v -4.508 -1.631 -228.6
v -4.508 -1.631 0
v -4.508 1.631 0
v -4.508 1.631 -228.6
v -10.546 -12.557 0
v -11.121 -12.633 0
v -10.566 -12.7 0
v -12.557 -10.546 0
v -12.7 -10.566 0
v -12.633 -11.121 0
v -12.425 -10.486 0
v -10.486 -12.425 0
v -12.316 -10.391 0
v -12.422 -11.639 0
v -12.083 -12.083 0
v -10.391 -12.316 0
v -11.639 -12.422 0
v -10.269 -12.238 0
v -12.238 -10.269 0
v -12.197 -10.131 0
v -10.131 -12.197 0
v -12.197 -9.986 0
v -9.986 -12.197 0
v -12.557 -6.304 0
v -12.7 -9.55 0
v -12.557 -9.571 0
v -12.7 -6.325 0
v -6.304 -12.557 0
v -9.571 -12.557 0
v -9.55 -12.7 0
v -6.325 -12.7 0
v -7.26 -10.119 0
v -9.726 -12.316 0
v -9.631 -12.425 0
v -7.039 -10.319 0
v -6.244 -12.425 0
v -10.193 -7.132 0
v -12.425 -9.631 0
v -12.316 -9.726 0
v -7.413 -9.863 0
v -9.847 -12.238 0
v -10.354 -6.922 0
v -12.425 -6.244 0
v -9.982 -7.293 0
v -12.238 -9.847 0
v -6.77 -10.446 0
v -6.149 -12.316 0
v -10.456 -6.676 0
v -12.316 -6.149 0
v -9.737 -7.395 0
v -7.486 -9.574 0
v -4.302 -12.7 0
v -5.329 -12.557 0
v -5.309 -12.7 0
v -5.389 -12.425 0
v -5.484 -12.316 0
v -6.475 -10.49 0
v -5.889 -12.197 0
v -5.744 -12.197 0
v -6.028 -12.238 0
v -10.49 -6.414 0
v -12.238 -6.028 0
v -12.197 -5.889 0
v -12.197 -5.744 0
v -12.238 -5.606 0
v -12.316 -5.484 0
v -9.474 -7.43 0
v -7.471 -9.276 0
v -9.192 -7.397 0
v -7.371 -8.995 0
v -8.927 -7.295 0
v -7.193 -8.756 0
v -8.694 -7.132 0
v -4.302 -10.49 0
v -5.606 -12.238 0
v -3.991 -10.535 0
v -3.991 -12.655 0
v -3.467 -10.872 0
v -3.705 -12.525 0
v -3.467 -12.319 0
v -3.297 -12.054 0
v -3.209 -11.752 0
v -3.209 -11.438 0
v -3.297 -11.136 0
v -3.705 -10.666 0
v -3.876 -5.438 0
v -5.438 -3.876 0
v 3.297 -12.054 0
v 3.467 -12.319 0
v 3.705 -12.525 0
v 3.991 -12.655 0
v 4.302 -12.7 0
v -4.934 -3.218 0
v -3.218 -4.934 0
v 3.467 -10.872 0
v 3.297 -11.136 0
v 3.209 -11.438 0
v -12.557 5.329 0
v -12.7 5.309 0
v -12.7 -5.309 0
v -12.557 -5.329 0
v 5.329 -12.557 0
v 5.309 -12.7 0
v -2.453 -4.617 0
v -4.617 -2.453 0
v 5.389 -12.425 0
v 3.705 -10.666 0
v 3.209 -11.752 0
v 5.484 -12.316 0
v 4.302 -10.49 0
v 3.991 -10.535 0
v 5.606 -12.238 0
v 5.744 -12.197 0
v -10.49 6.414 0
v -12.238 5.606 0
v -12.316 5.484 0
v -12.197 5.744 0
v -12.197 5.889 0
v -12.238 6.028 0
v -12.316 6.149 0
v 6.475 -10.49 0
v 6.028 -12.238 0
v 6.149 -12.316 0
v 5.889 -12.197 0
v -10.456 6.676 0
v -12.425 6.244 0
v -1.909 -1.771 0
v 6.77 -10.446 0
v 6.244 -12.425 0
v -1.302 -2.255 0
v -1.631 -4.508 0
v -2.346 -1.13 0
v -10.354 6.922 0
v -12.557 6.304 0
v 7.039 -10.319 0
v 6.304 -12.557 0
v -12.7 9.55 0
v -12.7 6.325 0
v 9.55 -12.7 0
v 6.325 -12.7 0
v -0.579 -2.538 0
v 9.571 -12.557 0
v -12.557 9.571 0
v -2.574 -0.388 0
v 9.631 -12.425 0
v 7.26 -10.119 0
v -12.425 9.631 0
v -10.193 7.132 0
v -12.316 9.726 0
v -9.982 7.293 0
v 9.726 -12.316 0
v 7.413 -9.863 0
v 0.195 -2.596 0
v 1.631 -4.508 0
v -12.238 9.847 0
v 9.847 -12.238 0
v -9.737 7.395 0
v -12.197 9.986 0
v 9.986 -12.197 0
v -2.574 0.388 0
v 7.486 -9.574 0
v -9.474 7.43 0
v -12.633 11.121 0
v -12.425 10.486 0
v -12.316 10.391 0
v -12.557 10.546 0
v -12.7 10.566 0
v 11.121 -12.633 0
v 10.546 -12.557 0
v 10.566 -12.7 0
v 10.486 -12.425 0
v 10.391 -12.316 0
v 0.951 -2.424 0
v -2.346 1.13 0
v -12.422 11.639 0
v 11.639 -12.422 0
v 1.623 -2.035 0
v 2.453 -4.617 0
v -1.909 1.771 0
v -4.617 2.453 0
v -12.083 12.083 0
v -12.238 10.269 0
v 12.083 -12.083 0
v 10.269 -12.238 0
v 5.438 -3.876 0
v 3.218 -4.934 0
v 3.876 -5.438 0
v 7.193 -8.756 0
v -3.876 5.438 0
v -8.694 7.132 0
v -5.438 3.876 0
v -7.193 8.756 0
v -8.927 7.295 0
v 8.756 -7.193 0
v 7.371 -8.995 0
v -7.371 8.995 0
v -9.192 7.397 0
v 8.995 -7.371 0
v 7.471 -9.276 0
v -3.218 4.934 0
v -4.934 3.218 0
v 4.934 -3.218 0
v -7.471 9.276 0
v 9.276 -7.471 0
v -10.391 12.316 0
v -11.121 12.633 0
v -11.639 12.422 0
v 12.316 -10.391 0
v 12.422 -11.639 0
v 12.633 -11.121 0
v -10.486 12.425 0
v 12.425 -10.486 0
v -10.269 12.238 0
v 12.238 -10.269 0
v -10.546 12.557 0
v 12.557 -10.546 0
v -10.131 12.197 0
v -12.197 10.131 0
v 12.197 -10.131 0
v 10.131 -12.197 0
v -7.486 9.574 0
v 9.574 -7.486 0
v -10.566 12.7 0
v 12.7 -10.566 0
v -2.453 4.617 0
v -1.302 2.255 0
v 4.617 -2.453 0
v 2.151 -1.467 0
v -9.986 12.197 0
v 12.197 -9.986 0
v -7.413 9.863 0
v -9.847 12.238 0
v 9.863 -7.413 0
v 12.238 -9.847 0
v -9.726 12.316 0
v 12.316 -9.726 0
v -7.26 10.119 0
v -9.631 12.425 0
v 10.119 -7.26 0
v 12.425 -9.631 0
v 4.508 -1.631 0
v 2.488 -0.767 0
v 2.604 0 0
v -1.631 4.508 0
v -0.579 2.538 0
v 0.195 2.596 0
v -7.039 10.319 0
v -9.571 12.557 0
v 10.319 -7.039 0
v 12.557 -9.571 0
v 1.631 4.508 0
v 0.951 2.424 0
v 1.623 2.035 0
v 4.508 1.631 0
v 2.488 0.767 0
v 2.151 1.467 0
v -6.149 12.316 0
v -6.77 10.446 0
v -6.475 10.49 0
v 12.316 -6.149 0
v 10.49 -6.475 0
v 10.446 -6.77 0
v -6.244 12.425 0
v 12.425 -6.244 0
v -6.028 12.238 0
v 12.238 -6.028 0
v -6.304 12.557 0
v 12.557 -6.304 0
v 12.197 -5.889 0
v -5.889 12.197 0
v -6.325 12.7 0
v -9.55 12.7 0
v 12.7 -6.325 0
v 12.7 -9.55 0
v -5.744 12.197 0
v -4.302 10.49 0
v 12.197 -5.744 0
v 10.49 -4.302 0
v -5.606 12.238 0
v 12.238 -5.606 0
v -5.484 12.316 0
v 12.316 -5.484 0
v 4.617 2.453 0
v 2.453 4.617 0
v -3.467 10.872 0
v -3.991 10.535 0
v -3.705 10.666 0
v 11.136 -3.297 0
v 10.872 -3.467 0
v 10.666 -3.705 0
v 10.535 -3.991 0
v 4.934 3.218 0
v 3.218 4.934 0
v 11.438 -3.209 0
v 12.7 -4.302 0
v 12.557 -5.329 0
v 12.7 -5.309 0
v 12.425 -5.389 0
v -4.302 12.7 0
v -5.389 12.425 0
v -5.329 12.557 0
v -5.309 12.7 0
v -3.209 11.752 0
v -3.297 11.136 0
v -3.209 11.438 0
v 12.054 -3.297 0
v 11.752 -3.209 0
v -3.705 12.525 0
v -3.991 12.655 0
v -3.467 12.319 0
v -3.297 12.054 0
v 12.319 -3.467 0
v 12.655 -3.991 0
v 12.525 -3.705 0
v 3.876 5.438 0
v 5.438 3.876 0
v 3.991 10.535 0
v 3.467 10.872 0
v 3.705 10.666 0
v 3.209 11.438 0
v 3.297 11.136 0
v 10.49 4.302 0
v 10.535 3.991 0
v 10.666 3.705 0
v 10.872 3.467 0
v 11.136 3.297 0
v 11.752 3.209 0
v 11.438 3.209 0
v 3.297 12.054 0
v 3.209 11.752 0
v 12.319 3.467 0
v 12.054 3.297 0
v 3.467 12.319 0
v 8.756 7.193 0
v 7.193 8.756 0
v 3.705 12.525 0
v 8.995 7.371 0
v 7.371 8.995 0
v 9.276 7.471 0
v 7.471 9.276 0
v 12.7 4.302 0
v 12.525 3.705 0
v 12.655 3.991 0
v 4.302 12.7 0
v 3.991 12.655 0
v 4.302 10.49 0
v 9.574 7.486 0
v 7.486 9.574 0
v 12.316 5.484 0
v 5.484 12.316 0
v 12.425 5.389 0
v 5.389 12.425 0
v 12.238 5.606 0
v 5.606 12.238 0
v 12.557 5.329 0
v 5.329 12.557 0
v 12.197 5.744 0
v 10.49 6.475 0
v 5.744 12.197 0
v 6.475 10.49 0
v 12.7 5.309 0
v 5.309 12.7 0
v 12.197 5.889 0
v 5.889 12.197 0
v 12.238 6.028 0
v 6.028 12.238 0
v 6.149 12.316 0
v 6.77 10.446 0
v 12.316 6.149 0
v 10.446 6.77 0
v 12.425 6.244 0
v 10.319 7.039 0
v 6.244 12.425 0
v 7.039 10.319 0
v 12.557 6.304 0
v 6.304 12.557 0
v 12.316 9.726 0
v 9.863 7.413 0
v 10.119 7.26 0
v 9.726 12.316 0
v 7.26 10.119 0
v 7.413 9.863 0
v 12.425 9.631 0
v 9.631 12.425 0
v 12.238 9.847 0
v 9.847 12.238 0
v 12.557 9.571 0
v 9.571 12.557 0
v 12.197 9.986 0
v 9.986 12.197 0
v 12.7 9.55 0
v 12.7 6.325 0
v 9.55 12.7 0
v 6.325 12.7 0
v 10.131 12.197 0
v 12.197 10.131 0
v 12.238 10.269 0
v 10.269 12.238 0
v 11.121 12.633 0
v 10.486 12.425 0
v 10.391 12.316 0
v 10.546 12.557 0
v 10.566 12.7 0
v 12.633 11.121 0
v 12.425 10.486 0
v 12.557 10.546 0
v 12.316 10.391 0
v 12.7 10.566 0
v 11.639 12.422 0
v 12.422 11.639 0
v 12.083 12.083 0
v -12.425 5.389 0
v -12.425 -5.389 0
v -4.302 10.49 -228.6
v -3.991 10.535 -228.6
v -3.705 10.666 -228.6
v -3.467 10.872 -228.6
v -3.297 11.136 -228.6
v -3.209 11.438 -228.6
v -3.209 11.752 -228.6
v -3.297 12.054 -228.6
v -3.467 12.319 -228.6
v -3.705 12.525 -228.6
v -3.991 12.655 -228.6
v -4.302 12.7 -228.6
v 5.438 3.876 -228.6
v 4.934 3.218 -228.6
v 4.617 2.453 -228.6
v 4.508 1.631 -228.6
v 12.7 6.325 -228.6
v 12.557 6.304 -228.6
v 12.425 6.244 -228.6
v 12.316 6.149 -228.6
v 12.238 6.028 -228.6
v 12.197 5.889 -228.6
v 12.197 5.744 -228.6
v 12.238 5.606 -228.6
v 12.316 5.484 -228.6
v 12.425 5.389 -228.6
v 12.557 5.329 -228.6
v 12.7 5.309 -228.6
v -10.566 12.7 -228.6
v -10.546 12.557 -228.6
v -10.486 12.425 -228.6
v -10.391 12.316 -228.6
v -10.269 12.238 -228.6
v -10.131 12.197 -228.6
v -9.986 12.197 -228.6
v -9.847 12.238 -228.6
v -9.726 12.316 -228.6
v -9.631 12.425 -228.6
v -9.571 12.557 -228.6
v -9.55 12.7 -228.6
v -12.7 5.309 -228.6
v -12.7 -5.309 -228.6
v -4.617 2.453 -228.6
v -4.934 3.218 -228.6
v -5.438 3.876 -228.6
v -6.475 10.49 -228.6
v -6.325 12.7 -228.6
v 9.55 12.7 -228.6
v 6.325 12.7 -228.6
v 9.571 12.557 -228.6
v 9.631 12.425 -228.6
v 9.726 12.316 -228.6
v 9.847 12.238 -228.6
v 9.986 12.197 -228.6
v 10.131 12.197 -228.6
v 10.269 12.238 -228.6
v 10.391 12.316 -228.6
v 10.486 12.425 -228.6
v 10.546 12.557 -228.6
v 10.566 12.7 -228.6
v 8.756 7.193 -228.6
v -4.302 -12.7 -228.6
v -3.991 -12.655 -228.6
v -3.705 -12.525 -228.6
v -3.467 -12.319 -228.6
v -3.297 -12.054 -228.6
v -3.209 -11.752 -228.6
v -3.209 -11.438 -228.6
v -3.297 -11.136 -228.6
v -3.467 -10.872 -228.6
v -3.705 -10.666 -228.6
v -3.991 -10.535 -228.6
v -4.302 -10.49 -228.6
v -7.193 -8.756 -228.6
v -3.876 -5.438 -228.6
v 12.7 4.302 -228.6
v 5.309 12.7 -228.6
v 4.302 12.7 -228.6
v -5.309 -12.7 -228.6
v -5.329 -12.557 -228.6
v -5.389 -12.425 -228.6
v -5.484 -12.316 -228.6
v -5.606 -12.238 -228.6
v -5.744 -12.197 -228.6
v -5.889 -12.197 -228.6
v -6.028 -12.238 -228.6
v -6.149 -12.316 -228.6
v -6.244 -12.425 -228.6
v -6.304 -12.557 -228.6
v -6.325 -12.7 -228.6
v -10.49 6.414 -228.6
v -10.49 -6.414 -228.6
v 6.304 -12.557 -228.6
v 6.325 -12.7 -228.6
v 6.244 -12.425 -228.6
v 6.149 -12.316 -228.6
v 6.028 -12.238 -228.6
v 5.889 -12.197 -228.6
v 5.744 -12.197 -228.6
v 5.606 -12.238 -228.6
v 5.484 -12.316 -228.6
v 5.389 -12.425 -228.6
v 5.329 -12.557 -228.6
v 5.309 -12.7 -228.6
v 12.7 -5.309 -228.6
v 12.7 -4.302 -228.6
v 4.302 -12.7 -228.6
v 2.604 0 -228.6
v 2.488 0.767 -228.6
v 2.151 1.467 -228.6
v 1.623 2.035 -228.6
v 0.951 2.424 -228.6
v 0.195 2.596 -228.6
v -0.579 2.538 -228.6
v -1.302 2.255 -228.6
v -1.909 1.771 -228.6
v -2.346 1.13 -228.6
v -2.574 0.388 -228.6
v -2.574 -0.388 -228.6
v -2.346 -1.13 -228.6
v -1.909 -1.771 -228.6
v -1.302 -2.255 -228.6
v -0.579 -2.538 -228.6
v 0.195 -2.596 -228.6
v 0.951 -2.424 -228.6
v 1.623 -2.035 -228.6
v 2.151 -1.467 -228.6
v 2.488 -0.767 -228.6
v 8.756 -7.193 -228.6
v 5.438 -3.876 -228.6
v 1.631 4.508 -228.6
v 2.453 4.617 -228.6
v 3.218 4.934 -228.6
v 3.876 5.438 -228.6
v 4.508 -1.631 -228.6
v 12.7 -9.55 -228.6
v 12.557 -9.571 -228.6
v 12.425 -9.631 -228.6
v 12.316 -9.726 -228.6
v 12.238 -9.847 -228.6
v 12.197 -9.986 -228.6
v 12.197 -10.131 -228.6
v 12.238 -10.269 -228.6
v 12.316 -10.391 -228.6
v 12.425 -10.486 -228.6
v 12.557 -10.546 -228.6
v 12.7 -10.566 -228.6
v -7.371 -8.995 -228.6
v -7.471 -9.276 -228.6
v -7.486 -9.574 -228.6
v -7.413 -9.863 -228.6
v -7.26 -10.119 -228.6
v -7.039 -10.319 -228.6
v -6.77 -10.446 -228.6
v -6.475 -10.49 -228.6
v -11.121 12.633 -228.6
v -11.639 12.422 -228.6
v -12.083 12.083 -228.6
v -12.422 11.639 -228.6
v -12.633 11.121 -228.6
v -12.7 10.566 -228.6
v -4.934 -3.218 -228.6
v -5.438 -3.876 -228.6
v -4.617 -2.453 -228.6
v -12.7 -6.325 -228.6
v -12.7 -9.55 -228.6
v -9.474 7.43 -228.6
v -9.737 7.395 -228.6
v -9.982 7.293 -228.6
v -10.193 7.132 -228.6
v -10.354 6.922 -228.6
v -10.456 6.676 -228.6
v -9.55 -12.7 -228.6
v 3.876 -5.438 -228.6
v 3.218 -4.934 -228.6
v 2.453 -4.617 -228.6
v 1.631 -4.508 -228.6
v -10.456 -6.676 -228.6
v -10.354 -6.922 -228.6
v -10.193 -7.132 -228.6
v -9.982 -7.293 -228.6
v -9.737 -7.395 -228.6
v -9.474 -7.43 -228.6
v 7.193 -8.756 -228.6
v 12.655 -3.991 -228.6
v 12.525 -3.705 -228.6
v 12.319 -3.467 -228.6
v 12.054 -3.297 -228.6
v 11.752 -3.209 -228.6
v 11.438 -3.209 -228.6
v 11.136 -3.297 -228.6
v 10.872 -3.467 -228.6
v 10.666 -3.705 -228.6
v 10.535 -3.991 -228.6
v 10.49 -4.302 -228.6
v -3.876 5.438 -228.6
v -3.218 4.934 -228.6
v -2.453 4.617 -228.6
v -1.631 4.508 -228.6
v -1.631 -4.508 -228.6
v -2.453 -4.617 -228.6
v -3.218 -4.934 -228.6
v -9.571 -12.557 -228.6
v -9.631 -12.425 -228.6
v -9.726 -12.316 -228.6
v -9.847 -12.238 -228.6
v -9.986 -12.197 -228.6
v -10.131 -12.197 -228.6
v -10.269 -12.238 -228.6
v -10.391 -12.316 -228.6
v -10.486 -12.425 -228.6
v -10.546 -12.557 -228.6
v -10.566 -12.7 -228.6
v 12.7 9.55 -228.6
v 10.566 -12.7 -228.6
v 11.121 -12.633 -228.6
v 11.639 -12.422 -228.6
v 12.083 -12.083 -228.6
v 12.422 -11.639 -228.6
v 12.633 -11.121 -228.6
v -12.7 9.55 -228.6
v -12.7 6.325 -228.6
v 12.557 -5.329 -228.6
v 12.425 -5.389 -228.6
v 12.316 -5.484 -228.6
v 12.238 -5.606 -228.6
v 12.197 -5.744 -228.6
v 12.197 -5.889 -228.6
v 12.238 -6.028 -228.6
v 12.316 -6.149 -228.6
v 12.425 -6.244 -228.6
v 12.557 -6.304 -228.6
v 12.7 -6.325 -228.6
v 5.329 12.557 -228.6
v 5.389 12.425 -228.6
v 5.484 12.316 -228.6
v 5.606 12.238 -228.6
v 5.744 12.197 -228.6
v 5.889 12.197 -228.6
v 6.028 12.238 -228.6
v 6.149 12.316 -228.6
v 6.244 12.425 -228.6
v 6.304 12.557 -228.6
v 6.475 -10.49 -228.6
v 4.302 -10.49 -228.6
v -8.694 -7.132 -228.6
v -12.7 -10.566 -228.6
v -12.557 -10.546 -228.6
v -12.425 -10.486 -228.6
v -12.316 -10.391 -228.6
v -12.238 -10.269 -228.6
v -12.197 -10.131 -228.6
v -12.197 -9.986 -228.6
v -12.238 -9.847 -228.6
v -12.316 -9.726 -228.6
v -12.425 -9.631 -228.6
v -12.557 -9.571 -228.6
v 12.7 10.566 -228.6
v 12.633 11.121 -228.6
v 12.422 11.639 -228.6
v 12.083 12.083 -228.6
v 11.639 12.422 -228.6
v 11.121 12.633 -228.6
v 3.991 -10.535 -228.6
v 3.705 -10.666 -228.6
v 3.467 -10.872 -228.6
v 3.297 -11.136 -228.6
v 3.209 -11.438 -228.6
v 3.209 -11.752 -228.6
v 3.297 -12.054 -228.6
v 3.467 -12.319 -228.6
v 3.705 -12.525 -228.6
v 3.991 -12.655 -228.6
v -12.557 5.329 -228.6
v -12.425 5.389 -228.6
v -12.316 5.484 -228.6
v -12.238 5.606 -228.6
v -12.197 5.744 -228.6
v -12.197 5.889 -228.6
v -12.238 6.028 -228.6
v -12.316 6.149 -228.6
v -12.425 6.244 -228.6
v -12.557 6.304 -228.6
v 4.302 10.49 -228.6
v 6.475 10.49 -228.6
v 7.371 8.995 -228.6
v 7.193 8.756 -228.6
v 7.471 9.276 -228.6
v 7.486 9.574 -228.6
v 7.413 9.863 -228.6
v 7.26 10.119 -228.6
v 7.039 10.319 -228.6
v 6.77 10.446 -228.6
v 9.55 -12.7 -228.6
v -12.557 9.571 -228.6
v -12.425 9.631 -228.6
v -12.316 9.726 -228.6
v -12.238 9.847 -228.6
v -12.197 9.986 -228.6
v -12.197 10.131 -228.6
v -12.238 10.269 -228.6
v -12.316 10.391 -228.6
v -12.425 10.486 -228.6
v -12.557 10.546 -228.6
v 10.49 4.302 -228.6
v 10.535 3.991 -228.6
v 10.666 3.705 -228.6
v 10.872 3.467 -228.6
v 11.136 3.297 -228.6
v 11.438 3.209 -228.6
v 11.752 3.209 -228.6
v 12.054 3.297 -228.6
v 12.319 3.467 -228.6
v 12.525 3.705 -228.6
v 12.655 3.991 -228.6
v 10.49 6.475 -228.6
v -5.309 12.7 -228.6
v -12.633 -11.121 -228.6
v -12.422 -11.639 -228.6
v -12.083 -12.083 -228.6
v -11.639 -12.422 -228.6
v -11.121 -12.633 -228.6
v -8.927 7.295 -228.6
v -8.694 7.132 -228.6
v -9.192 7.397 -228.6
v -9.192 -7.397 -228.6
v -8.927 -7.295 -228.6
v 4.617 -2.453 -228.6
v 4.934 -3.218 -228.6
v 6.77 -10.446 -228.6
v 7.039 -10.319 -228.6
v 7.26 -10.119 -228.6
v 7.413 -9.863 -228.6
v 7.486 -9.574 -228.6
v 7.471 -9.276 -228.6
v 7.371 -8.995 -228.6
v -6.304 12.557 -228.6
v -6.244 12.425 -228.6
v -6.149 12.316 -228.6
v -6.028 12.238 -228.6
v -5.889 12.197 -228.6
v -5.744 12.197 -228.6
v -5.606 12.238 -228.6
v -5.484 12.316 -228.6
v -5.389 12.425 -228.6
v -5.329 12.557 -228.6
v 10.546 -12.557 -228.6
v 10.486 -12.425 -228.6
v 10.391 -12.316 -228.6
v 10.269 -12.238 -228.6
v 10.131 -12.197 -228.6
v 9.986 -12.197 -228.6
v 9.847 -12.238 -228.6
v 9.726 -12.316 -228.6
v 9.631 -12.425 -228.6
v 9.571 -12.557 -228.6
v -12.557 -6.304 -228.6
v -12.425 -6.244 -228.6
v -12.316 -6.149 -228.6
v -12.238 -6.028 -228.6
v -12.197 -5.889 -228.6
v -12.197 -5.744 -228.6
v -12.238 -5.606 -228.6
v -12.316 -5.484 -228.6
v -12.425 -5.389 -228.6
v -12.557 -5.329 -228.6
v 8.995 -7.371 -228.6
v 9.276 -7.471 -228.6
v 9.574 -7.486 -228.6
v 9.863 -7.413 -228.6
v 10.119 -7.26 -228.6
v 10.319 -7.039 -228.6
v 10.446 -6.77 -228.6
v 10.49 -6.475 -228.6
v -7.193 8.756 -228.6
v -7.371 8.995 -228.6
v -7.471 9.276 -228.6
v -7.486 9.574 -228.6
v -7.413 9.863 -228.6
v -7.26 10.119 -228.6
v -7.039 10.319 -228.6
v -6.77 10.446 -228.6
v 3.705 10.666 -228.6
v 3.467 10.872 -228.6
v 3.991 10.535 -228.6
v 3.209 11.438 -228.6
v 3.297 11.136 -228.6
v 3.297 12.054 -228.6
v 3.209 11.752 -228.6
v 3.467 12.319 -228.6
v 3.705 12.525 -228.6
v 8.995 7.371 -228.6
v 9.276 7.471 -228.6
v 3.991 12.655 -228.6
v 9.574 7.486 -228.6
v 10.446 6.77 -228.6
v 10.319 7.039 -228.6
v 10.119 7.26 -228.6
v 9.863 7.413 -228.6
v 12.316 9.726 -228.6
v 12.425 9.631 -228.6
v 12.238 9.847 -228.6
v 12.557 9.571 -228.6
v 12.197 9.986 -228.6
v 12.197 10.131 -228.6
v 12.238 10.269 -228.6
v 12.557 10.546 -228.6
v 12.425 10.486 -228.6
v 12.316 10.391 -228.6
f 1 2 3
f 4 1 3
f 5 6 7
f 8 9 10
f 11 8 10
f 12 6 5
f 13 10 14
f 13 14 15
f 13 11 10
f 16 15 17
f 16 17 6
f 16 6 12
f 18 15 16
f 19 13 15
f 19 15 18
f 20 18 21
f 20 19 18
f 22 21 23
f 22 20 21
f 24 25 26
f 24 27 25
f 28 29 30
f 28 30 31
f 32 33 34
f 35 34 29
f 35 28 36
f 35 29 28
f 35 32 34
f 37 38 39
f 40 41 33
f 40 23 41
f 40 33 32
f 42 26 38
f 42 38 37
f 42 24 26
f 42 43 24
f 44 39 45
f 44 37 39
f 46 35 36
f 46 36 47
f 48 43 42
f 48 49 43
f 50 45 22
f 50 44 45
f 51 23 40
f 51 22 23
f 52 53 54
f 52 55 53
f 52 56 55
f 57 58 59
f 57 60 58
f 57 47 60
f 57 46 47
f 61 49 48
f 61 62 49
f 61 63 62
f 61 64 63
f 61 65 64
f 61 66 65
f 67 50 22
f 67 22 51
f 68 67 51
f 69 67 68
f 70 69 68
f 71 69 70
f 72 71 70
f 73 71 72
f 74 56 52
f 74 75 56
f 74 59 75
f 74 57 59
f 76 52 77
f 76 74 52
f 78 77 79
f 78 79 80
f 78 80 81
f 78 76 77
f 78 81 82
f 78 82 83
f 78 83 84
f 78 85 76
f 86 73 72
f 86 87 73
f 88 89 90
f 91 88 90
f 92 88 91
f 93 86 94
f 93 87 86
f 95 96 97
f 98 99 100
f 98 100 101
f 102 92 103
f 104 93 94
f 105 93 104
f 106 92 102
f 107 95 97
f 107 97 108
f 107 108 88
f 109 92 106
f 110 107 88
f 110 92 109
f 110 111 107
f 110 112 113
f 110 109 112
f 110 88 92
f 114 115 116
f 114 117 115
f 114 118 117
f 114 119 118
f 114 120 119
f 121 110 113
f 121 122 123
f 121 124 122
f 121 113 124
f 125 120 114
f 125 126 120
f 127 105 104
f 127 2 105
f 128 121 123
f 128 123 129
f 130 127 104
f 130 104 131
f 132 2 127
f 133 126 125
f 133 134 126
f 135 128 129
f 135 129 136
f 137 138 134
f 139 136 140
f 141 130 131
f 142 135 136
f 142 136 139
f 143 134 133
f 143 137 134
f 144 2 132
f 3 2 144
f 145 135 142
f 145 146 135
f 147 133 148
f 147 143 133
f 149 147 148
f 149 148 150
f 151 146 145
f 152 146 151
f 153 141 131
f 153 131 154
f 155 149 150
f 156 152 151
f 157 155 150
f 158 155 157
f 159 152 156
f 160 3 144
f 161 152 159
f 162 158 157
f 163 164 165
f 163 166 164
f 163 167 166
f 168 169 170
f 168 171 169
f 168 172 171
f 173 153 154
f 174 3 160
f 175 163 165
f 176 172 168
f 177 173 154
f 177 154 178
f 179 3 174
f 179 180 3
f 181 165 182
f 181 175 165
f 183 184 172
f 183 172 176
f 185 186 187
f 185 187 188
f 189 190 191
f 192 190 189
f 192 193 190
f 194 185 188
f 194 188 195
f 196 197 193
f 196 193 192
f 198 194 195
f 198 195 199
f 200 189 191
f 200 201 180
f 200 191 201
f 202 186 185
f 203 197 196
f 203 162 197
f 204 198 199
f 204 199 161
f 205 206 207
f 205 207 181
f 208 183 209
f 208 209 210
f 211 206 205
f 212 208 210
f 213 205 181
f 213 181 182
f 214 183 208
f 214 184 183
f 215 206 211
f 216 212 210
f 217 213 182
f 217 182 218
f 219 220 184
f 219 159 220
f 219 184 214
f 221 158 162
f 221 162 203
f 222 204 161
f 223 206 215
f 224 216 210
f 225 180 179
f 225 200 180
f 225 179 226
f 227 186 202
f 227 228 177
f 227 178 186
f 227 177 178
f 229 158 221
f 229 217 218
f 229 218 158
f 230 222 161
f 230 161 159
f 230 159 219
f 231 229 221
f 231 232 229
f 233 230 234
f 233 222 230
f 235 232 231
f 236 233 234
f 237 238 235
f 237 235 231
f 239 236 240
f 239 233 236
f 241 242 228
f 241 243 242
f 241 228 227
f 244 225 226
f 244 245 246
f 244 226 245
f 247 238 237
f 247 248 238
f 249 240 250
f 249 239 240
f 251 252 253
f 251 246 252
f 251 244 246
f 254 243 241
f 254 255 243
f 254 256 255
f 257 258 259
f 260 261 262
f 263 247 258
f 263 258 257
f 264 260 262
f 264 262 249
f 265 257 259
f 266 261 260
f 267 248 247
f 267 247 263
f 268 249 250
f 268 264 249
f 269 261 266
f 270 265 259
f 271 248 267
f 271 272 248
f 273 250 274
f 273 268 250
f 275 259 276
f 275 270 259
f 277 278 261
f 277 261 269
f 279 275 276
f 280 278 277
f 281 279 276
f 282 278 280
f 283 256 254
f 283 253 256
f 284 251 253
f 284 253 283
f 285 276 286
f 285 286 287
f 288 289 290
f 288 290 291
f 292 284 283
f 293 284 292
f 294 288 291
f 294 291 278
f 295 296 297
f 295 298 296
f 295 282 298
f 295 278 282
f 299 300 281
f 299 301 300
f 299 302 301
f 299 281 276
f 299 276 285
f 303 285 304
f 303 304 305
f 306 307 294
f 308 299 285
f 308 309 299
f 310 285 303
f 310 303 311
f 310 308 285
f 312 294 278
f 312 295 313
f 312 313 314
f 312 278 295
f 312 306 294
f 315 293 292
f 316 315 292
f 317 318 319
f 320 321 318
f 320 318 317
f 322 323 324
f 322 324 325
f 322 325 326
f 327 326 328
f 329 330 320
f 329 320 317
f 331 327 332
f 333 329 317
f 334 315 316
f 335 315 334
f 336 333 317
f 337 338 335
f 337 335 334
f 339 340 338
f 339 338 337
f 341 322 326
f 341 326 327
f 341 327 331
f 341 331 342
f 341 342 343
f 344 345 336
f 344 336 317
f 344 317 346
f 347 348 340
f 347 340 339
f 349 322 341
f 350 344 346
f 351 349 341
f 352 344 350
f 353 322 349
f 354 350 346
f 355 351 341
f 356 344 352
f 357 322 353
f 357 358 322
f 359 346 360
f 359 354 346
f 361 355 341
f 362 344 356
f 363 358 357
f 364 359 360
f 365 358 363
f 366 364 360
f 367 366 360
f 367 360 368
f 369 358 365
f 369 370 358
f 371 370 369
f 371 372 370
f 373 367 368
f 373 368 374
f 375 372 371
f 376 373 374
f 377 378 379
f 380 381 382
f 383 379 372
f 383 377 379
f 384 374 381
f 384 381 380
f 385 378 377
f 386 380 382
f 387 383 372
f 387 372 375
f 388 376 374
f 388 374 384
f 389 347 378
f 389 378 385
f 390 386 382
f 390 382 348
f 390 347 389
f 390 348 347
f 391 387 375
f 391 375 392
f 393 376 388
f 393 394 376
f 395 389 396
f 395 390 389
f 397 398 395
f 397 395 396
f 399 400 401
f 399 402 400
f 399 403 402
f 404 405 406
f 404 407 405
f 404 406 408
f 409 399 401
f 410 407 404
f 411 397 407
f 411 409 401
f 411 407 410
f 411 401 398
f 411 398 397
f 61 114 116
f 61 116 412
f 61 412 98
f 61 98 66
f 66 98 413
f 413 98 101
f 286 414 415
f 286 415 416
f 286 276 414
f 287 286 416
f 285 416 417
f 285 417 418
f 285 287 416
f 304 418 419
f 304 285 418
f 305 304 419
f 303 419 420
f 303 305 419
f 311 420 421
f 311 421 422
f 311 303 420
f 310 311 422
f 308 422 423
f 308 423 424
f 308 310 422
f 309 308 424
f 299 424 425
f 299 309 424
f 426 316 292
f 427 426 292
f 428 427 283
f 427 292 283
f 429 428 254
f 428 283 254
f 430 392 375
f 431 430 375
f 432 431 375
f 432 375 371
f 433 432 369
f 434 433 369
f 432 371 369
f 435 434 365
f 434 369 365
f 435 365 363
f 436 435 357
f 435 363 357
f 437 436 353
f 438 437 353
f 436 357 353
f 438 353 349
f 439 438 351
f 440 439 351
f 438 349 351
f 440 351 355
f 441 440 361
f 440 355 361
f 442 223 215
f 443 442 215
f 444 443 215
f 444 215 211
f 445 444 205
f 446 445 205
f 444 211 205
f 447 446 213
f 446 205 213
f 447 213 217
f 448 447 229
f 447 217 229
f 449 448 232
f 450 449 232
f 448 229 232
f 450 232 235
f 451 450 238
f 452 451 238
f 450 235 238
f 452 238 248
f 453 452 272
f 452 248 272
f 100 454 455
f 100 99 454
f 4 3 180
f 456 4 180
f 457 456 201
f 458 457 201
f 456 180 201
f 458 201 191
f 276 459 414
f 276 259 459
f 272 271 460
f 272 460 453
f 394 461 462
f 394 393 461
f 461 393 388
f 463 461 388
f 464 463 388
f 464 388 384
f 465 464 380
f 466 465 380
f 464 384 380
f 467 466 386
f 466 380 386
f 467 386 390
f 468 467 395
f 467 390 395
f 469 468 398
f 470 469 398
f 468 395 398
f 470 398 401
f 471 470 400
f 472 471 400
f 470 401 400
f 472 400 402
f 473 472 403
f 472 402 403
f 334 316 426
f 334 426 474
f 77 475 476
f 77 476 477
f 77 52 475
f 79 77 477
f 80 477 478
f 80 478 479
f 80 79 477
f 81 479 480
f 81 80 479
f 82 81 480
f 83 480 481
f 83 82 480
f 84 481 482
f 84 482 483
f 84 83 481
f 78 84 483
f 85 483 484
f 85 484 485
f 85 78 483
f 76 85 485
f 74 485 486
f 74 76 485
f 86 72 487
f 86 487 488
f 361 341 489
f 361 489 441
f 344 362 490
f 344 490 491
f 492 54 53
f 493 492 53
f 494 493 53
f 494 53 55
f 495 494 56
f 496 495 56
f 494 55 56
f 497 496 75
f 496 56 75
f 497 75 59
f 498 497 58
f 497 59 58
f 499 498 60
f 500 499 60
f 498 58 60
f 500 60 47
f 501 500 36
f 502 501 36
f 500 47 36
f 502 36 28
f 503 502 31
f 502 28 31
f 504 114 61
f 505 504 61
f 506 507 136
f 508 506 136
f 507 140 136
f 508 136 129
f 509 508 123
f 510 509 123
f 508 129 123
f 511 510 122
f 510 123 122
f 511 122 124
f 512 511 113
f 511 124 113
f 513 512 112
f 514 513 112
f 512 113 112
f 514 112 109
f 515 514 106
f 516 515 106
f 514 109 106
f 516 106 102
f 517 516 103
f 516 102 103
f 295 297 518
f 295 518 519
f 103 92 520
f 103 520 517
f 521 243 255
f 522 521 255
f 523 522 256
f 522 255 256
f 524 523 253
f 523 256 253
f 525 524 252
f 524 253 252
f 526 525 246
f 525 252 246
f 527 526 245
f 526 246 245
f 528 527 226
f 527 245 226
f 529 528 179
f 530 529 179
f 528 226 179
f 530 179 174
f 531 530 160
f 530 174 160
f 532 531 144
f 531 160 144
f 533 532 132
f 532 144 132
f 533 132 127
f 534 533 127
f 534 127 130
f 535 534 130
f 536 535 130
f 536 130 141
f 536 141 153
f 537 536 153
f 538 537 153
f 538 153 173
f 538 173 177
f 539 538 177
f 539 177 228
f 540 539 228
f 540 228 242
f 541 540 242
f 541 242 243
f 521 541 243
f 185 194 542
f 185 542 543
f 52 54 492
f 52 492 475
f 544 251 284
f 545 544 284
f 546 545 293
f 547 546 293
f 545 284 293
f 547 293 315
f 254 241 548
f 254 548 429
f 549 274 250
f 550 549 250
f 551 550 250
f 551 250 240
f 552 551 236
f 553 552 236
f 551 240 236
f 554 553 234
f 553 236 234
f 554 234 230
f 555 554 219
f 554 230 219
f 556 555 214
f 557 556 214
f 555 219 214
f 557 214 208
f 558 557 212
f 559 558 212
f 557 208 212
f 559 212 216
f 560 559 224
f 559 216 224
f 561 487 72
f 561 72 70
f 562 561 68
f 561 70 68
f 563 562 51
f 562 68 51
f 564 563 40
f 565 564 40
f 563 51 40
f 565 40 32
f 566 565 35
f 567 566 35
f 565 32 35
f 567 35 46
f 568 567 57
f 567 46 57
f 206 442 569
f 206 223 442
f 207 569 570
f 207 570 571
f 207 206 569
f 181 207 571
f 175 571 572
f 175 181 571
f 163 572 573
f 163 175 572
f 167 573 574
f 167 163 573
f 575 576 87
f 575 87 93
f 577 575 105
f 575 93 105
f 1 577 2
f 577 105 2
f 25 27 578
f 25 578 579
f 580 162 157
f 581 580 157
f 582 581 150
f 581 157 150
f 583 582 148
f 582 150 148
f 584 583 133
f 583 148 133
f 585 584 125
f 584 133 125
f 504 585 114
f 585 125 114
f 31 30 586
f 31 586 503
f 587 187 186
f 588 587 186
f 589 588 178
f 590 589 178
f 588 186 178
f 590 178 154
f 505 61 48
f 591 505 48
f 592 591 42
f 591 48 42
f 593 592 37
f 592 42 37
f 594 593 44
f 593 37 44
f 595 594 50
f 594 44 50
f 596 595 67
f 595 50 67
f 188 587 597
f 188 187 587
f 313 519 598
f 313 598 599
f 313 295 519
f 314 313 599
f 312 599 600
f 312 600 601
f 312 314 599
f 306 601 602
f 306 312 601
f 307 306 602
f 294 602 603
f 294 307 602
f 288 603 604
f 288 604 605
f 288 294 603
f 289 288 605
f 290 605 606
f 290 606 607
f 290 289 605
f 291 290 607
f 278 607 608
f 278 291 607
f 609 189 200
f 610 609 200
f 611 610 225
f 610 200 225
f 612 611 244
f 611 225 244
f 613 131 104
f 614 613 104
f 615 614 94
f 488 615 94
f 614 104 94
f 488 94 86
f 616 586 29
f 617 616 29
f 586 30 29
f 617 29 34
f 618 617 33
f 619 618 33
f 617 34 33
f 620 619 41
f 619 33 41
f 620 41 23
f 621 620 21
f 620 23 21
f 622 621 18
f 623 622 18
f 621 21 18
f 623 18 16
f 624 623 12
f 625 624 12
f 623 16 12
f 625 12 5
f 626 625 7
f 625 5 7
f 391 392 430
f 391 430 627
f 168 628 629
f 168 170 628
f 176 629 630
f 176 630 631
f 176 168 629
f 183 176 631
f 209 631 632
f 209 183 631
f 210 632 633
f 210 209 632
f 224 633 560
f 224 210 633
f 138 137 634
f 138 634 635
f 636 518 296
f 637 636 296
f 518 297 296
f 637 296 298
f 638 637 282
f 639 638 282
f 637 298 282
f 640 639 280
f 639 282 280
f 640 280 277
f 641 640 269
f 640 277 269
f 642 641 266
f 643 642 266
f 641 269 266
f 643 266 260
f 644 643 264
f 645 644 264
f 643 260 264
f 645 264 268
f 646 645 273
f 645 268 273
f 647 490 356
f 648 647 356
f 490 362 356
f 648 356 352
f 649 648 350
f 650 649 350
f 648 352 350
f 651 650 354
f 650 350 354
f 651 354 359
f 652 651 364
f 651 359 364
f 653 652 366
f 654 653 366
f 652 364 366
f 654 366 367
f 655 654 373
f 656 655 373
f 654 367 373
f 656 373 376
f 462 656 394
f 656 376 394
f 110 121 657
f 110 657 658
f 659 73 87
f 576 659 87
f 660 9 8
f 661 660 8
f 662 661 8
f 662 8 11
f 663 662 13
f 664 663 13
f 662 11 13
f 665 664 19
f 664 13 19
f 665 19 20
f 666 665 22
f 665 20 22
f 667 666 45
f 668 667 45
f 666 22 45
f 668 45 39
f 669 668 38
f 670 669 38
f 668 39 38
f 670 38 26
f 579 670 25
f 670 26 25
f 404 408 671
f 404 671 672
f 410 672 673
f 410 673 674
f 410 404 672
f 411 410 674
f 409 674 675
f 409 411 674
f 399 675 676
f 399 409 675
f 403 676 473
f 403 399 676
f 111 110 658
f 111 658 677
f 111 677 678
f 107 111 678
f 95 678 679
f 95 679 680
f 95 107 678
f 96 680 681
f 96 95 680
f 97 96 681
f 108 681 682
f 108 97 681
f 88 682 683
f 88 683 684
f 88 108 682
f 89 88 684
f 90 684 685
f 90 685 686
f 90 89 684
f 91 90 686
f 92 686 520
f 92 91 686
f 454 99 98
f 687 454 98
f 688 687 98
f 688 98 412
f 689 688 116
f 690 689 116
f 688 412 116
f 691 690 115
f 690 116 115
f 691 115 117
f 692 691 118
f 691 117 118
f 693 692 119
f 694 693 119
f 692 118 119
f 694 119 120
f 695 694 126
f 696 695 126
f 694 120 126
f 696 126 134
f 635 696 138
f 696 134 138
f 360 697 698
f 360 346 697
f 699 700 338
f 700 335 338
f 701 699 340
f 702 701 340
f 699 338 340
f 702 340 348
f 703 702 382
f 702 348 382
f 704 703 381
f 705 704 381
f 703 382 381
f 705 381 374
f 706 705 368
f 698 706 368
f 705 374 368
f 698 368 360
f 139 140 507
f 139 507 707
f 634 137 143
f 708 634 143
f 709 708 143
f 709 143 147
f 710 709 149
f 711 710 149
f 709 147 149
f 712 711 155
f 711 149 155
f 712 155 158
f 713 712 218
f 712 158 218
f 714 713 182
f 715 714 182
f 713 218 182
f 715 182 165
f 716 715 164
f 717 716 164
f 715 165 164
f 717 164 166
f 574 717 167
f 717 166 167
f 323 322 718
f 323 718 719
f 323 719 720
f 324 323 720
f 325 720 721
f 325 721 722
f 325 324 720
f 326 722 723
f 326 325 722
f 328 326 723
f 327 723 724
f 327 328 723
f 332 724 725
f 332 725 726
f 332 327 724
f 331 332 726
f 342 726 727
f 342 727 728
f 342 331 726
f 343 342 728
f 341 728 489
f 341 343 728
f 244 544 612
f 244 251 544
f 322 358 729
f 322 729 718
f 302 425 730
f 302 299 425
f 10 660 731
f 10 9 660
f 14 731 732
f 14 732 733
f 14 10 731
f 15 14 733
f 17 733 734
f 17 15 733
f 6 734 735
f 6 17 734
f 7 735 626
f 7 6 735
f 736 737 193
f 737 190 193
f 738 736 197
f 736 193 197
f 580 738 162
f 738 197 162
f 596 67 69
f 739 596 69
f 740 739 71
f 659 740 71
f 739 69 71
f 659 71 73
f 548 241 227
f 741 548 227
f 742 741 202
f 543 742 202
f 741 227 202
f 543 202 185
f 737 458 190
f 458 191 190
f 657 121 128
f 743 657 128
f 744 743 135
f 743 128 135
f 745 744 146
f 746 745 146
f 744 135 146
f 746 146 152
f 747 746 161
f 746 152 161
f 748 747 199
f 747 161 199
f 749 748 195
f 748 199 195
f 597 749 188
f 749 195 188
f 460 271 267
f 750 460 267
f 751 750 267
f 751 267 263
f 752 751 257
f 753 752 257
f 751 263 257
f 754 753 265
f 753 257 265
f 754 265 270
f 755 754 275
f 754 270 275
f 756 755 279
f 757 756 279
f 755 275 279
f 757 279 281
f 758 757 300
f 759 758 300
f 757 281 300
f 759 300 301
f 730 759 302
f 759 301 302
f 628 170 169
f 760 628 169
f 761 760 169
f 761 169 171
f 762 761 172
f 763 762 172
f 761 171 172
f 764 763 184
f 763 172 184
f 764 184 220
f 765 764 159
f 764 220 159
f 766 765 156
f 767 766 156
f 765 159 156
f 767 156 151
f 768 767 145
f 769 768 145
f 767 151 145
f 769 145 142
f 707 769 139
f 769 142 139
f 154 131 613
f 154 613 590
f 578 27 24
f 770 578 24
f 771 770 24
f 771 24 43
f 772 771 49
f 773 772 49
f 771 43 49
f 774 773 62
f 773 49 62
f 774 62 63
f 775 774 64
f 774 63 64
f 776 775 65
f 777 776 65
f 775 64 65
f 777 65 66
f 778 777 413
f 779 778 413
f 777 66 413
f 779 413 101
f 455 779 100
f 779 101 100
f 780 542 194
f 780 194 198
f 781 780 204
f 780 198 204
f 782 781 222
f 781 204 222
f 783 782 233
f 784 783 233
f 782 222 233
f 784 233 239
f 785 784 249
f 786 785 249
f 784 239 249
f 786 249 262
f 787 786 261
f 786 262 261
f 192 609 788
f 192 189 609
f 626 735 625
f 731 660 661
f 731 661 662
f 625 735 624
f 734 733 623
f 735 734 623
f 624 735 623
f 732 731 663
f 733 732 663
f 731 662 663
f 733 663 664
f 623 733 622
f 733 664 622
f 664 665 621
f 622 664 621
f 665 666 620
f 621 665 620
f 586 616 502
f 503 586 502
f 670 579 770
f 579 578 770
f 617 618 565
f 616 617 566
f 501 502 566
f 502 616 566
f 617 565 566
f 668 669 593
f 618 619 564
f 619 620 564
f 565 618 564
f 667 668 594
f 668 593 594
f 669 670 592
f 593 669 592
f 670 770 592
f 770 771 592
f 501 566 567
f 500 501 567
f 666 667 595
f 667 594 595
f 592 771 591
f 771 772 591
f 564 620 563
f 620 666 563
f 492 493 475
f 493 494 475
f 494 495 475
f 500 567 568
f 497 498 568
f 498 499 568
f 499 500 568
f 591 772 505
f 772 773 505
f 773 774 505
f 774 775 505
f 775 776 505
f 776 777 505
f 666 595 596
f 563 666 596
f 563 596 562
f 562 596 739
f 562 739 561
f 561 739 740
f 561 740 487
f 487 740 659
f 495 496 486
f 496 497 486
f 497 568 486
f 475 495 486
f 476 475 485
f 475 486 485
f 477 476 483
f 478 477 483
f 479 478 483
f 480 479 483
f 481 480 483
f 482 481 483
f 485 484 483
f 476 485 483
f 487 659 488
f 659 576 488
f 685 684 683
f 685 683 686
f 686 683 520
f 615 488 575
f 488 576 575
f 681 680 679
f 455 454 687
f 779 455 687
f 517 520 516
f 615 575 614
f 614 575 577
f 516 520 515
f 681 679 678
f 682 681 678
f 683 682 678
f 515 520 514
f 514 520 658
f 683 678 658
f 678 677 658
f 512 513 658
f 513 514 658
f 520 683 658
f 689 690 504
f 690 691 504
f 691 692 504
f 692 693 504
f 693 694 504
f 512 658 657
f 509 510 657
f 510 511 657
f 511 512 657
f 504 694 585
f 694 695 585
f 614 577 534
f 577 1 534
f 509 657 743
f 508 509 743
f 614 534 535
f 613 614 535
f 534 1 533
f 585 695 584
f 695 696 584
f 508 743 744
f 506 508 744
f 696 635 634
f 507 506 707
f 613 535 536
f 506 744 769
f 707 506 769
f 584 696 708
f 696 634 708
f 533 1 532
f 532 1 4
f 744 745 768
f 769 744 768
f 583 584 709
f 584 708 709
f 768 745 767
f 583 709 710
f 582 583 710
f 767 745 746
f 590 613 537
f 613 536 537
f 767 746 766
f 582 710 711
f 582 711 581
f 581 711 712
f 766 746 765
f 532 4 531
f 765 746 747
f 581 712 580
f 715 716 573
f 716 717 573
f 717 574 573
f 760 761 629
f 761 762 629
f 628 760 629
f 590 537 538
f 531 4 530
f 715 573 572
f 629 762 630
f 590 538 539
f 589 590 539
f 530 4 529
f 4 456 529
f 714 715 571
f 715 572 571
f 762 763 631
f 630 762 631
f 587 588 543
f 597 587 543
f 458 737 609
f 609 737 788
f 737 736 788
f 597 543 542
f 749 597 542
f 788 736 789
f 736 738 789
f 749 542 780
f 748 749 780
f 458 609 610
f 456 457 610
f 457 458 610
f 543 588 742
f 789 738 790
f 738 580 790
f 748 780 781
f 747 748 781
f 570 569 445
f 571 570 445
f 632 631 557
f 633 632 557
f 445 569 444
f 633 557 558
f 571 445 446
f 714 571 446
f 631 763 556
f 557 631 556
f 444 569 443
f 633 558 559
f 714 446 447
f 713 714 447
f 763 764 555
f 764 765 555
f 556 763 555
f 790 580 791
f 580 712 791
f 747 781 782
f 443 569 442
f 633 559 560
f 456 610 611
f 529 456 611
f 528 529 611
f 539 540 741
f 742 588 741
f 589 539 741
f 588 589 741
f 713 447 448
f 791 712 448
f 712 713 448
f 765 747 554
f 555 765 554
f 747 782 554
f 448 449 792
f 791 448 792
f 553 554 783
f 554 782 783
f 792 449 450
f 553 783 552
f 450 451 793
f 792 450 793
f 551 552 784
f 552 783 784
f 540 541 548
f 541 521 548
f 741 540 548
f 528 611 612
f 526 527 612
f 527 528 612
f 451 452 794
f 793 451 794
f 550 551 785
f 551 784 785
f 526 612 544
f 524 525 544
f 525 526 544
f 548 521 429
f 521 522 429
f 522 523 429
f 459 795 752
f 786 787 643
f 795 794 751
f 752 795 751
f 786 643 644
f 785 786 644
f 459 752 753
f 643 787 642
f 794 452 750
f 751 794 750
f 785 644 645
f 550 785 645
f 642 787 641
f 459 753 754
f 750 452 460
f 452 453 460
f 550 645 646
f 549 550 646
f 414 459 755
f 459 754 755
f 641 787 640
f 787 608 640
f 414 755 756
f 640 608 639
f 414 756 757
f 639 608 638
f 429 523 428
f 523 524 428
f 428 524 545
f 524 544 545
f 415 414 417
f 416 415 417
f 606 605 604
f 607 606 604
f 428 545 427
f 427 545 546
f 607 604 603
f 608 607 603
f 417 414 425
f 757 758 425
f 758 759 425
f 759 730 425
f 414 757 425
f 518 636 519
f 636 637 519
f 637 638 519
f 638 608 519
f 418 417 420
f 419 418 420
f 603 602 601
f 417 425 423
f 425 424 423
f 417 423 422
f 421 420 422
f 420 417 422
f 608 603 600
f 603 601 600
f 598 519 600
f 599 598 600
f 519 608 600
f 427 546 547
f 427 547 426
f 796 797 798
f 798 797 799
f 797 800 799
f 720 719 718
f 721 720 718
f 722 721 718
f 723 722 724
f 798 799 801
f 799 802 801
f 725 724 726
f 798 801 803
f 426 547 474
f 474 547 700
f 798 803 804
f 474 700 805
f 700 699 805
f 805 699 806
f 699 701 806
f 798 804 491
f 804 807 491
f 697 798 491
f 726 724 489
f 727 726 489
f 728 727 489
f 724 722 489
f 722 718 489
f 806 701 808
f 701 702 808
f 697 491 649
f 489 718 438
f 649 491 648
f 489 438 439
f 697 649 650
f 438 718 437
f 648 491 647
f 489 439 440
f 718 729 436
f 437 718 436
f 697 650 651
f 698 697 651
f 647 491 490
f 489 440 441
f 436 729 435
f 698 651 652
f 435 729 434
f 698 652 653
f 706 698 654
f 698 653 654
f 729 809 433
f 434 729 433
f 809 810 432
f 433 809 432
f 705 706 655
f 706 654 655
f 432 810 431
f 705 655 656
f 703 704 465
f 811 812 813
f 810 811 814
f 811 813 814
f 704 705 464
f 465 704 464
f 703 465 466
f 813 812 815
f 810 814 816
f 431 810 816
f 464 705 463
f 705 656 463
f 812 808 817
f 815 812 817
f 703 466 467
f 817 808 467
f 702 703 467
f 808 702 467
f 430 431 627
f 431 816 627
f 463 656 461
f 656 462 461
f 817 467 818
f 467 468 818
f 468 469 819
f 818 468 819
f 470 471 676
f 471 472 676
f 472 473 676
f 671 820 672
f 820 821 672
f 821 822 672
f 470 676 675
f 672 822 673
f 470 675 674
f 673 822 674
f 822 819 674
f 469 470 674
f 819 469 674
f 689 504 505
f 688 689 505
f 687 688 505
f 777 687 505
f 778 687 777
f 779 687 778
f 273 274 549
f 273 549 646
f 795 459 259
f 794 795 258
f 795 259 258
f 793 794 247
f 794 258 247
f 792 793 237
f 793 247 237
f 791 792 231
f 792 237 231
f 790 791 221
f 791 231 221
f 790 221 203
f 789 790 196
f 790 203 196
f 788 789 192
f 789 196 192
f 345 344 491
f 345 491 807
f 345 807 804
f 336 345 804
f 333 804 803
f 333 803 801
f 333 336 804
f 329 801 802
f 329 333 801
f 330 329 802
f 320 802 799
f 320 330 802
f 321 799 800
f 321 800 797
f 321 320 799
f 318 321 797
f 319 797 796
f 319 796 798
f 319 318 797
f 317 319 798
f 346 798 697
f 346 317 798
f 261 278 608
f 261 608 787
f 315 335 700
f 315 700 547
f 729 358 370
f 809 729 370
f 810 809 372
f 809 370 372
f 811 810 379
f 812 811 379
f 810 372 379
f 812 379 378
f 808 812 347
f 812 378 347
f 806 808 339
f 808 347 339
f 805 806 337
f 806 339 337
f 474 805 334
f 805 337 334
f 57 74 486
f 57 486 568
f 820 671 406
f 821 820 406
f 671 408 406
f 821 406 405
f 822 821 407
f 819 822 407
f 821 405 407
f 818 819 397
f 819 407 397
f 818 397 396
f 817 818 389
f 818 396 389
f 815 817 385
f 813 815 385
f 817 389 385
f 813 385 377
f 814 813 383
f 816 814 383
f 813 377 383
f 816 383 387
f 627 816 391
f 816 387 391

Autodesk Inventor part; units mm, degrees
ref_plane "YZ Plane" through (0, 0, 0) normal (1, 0, 0) x (0, 1, 0)
ref_plane "XZ Plane" through (0, 0, 0) normal (0, 1, 0) x (-1, 0, 0)
ref_plane "XY Plane" through (0, 0, 0) normal (0, 0, 1) x (1, 0, 0)
sketch "Sketch_1" plane through (0, 0, 0) normal (0, 0, 1) x (1, 0, 0)
  arc A0 (-12.7, -10.5664) -> (-10.5664, -12.7) centre (-10.592, -10.592) ccw
  arc A1 (-9.5504, -12.7) -> (-10.5664, -12.7) centre (-10.0584, -12.7) ccw
  line L0 (-9.5504, -12.7) -> (-6.3246, -12.7)
  arc A2 (-5.3086, -12.7) -> (-6.3246, -12.7) centre (-5.8166, -12.7) ccw
  line L1 (-5.3086, -12.7) -> (-4.3023, -12.7)
  arc A3 (-4.3023, -12.7) -> (-4.3023, -10.4902) centre (-4.3023, -11.5951) ccw
  line L2 (-4.3023, -10.4902) -> (-6.4748, -10.4902)
  arc A4 (-7.1932, -8.7558) -> (-6.4748, -10.4902) centre (-6.4748, -9.4742) ccw
  line L3 (-7.1932, -8.7558) -> (-3.8759, -5.4384)
  arc A5 (-1.6308, -4.5085) -> (-3.8759, -5.4384) centre (-1.6308, -7.6835) ccw
  line L4 (-1.6308, -4.5085) -> (1.6308, -4.5085)
  arc A6 (3.8759, -5.4384) -> (1.6308, -4.5085) centre (1.6308, -7.6835) ccw
  line L5 (3.8759, -5.4384) -> (7.1932, -8.7558)
  arc A7 (6.4748, -10.4902) -> (7.1932, -8.7558) centre (6.4748, -9.4742) ccw
  line L6 (6.4748, -10.4902) -> (4.3023, -10.4902)
  arc A8 (4.3023, -10.4902) -> (4.3023, -12.7) centre (4.3023, -11.5951) ccw
  line L7 (4.3023, -12.7) -> (5.3086, -12.7)
  arc A9 (6.3246, -12.7) -> (5.3086, -12.7) centre (5.8166, -12.7) ccw
  line L8 (6.3246, -12.7) -> (9.5504, -12.7)
  arc A10 (10.5664, -12.7) -> (9.5504, -12.7) centre (10.0584, -12.7) ccw
  arc A11 (10.5664, -12.7) -> (12.7, -10.5664) centre (10.592, -10.592) ccw
  arc A12 (12.7, -9.5504) -> (12.7, -10.5664) centre (12.7, -10.0584) ccw
  line L9 (12.7, -9.5504) -> (12.7, -6.3246)
  arc A13 (12.7, -5.3086) -> (12.7, -6.3246) centre (12.7, -5.8166) ccw
  line L10 (12.7, -5.3086) -> (12.7, -4.3023)
  arc A14 (12.7, -4.3023) -> (10.4902, -4.3023) centre (11.5951, -4.3023) ccw
  line L11 (10.4902, -4.3023) -> (10.4902, -6.4748)
  arc A15 (8.7558, -7.1932) -> (10.4902, -6.4748) centre (9.4742, -6.4748) ccw
  line L12 (8.7558, -7.1932) -> (5.4384, -3.8759)
  arc A16 (4.5085, -1.6308) -> (5.4384, -3.8759) centre (7.6835, -1.6308) ccw
  line L13 (4.5085, -1.6308) -> (4.5085, 1.6308)
  arc A17 (5.4384, 3.8759) -> (4.5085, 1.6308) centre (7.6835, 1.6308) ccw
  line L14 (5.4384, 3.8759) -> (8.7558, 7.1932)
  arc A18 (10.4902, 6.4748) -> (8.7558, 7.1932) centre (9.4742, 6.4748) ccw
  line L15 (10.4902, 6.4748) -> (10.4902, 4.3023)
  arc A19 (10.4902, 4.3023) -> (12.7, 4.3023) centre (11.5951, 4.3023) ccw
  line L16 (12.7, 4.3023) -> (12.7, 5.3086)
  arc A20 (12.7, 6.3246) -> (12.7, 5.3086) centre (12.7, 5.8166) ccw
  line L17 (12.7, 6.3246) -> (12.7, 9.5504)
  arc A21 (12.7, 10.5664) -> (12.7, 9.5504) centre (12.7, 10.0584) ccw
  arc A22 (12.7, 10.5664) -> (10.5664, 12.7) centre (10.592, 10.592) ccw
  arc A23 (9.5504, 12.7) -> (10.5664, 12.7) centre (10.0584, 12.7) ccw
  line L18 (9.5504, 12.7) -> (6.3246, 12.7)
  arc A24 (5.3086, 12.7) -> (6.3246, 12.7) centre (5.8166, 12.7) ccw
  line L19 (5.3086, 12.7) -> (4.3023, 12.7)
  arc A25 (4.3023, 12.7) -> (4.3023, 10.4902) centre (4.3023, 11.5951) ccw
  line L20 (4.3023, 10.4902) -> (6.4748, 10.4902)
  arc A26 (7.1932, 8.7558) -> (6.4748, 10.4902) centre (6.4748, 9.4742) ccw
  line L21 (7.1932, 8.7558) -> (3.8759, 5.4384)
  arc A27 (1.6308, 4.5085) -> (3.8759, 5.4384) centre (1.6308, 7.6835) ccw
  line L22 (1.6308, 4.5085) -> (-1.6308, 4.5085)
  arc A28 (-3.8759, 5.4384) -> (-1.6308, 4.5085) centre (-1.6308, 7.6835) ccw
  line L23 (-3.8759, 5.4384) -> (-7.1932, 8.7558)
  arc A29 (-6.4748, 10.4902) -> (-7.1932, 8.7558) centre (-6.4748, 9.4742) ccw
  line L24 (-6.4748, 10.4902) -> (-4.3023, 10.4902)
  arc A30 (-4.3023, 10.4902) -> (-4.3023, 12.7) centre (-4.3023, 11.5951) ccw
  line L25 (-4.3023, 12.7) -> (-5.3086, 12.7)
  arc A31 (-6.3246, 12.7) -> (-5.3086, 12.7) centre (-5.8166, 12.7) ccw
  line L26 (-6.3246, 12.7) -> (-9.5504, 12.7)
  arc A32 (-10.5664, 12.7) -> (-9.5504, 12.7) centre (-10.0584, 12.7) ccw
  arc A33 (-10.5664, 12.7) -> (-12.7, 10.5664) centre (-10.592, 10.592) ccw
  arc A34 (-12.7, 9.5504) -> (-12.7, 10.5664) centre (-12.7, 10.0584) ccw
  line L27 (-12.7, 9.5504) -> (-12.7, 6.3246)
  arc A35 (-12.7, 5.3086) -> (-12.7, 6.3246) centre (-12.7, 5.8166) ccw
  line L28 (-12.7, 5.3086) -> (-12.7, -5.3086)
  arc A36 (-12.7, -6.3246) -> (-12.7, -5.3086) centre (-12.7, -5.8166) ccw
  line L29 (-12.7, -6.3246) -> (-12.7, -9.5504)
  arc A37 (-12.7, -10.5664) -> (-12.7, -9.5504) centre (-12.7, -10.0584) ccw
  circle A38 centre (0, 0) radius 2.6035
  arc A39 (-10.4902, -6.4135) -> (-9.4742, -7.4295) centre (-9.4742, -6.4135) ccw
  arc A40 (-9.4742, -7.4295) -> (-8.6945, -7.1319) centre (-9.4638, -6.2865) ccw
  line L30 (-8.6945, -7.1319) -> (-5.4384, -3.8759)
  arc A41 (-5.4384, -3.8759) -> (-4.5085, -1.6308) centre (-7.6835, -1.6308) ccw
  line L31 (-4.5085, -1.6308) -> (-4.5085, 1.6308)
  arc A42 (-4.5085, 1.6308) -> (-5.4384, 3.8759) centre (-7.6835, 1.6308) ccw
  line L32 (-5.4384, 3.8759) -> (-8.6945, 7.1319)
  arc A43 (-8.6945, 7.1319) -> (-9.4742, 7.4295) centre (-9.4638, 6.2865) ccw
  arc A44 (-9.4742, 7.4295) -> (-10.4902, 6.4135) centre (-9.4742, 6.4135) ccw
  line L33 (-10.4902, 6.4135) -> (-10.4902, -6.4135)
extrude "Extrusion1" add sketch "Sketch_1" against normal blind 228.6
properties part number "1003-9-CL"
